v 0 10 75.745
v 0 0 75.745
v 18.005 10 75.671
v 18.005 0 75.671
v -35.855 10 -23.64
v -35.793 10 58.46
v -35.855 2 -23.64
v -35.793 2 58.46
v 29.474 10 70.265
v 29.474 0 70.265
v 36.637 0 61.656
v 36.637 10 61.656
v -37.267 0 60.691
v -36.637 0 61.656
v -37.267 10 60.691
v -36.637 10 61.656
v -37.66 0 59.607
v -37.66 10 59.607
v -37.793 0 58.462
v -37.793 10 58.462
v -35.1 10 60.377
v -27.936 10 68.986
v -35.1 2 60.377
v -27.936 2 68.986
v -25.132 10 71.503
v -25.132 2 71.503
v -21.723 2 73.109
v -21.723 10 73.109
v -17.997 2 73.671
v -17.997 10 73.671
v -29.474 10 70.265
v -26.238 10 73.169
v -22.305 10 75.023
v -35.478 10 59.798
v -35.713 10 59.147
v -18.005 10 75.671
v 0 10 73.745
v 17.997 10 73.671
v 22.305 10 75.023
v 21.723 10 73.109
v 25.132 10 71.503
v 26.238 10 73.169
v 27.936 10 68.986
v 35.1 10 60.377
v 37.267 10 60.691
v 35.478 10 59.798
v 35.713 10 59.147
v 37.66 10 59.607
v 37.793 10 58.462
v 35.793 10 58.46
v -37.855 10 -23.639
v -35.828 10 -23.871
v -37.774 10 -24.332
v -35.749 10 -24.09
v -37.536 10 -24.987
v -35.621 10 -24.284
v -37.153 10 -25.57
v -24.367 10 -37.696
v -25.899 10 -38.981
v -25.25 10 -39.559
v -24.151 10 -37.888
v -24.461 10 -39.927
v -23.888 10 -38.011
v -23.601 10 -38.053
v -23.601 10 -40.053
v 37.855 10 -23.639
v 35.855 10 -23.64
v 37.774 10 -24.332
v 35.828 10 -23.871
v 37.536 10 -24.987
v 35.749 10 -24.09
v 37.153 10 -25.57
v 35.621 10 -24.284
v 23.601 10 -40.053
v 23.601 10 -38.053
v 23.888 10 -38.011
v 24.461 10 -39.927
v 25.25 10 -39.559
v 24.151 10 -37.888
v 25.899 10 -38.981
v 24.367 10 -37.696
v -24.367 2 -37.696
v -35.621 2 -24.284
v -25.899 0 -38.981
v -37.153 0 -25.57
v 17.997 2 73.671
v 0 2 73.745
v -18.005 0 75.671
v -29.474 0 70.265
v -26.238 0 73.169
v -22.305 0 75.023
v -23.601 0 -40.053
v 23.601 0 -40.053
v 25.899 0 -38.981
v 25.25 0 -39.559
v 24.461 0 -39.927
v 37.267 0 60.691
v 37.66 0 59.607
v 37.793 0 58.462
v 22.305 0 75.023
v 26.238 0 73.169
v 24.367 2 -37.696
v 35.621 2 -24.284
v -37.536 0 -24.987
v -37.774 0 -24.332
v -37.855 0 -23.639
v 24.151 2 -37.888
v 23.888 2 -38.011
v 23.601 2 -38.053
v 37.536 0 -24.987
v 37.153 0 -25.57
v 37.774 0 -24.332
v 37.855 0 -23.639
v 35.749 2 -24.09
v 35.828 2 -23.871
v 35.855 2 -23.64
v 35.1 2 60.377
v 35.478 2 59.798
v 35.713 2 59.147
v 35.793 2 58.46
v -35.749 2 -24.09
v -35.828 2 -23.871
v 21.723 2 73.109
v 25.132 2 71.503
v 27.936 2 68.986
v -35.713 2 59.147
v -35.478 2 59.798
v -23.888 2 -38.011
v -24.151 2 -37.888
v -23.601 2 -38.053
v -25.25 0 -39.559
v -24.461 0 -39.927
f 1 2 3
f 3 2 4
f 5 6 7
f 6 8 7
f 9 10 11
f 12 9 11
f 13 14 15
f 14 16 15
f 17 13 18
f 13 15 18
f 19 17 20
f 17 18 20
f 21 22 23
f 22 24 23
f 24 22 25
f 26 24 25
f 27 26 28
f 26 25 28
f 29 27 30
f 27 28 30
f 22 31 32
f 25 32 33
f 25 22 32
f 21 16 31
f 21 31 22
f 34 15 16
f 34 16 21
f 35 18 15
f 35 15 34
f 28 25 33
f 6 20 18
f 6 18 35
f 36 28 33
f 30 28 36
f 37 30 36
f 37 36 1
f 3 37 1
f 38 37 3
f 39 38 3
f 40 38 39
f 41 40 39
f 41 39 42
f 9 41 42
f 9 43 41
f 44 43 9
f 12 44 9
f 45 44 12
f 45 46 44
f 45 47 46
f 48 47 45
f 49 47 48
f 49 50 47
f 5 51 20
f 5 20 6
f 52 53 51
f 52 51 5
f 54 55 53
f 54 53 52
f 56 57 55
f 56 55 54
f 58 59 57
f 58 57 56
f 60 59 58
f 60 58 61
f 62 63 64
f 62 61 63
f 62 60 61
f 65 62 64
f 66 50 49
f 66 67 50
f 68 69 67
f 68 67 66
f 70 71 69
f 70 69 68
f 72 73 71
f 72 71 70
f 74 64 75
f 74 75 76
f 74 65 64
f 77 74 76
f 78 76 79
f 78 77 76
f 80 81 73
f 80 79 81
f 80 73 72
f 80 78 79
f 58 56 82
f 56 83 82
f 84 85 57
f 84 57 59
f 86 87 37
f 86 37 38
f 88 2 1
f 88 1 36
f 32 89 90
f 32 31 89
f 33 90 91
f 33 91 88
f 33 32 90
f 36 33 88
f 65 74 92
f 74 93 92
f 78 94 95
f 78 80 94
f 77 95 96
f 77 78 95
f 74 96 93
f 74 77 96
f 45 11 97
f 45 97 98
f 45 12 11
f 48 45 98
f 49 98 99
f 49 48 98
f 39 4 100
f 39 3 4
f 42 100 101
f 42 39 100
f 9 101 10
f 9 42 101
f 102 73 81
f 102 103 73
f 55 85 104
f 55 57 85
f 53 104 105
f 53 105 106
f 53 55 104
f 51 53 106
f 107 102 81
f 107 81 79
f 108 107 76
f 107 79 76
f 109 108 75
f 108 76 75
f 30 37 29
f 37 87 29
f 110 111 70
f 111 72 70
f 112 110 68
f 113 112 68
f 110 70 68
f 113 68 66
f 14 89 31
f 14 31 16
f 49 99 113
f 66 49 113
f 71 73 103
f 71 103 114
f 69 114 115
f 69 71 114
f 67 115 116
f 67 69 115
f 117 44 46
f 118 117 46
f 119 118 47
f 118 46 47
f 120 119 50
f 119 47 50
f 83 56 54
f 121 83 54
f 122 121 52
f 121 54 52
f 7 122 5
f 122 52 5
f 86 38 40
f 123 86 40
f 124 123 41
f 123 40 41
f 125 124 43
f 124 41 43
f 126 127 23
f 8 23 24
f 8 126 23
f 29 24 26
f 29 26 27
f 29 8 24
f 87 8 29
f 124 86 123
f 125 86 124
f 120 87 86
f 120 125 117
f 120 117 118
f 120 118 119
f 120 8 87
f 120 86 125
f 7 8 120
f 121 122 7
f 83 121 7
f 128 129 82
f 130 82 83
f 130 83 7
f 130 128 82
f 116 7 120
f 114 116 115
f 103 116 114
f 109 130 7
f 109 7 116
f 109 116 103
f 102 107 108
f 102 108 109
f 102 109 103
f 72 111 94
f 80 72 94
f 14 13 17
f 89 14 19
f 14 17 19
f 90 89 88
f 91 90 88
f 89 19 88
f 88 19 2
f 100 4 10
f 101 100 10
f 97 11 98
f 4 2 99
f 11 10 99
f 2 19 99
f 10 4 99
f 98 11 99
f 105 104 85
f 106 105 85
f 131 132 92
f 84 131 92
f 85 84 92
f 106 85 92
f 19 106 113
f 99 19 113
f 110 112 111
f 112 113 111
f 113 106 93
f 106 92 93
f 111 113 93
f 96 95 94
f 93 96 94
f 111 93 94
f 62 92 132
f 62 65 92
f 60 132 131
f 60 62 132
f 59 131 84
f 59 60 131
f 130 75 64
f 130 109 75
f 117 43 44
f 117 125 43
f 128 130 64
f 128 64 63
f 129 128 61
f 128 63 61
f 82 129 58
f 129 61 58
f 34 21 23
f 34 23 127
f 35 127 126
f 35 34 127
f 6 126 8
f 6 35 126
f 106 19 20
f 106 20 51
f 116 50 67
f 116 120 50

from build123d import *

# Parameters (mm, degrees)
AUFSATZ_LINEAR_AUSTRAGEN1_DEPTH = 10
VERRUNDUNG11_R                  = 15
VERRUNDUNG12_R                  = 5
VERRUNDUNG13_R                  = 3
VERRUNDUNG14_R                  = 3
WANDUNG1_T                      = -2


with BuildPart() as part:
    # Skizze1 → Aufsatz-Linear austragen1 (new body)
    with BuildSketch(Plane(origin=(0, 0, 0), x_dir=(1, 0, 0), z_dir=(0, 1, 0))):
        Polygon((0, -75.745036748), (-24.999786643, -75.641751751), (-37.792132404, -60.267881388), (-37.855752194, 24.732118612), (-25, 40.053007474), (0, 40.053007474), align=None)
    aufsatz_linear_austragen1 = extrude(amount=AUFSATZ_LINEAR_AUSTRAGEN1_DEPTH)

    # Spiegeln1: Aufsatz-Linear austragen1 across plane
    add(aufsatz_linear_austragen1.mirror(Plane(origin=(0, 0, 0), x_dir=(0, 0, 1), z_dir=(1, 0, 0))))

    # Verrundung11
    verrundung11_edges = [part.edges().sort_by_distance(p)[0] for p in [
        (-24.999786643, 5, 75.641751751),
        (24.999786643, 5, 75.641751751),
    ]]
    fillet(verrundung11_edges, radius=VERRUNDUNG11_R)

    # Verrundung12
    verrundung12_edges = [part.edges().sort_by_distance(p)[0] for p in [
        (-37.792132404, 5, 60.267881388),
        (37.792132404, 5, 60.267881388),
    ]]
    fillet(verrundung12_edges, radius=VERRUNDUNG12_R)

    # Verrundung13
    verrundung13_edges = [part.edges().sort_by_distance(p)[0] for p in [
        (-25, 5, -40.053007474),
        (25, 5, -40.053007474),
    ]]
    fillet(verrundung13_edges, radius=VERRUNDUNG13_R)

    # Verrundung14
    verrundung14_edges = [part.edges().sort_by_distance(p)[0] for p in [
        (-37.855752194, 5, -24.732118612),
        (37.855752194, 5, -24.732118612),
    ]]
    fillet(verrundung14_edges, radius=VERRUNDUNG14_R)

    # Wandung1
    wandung1_openings = [part.faces().sort_by_distance(p)[0] for p in [
        (0, 10, 17.703317915),
    ]]
    offset(amount=WANDUNG1_T, openings=wandung1_openings, kind=Kind.INTERSECTION)


solid = part.part
